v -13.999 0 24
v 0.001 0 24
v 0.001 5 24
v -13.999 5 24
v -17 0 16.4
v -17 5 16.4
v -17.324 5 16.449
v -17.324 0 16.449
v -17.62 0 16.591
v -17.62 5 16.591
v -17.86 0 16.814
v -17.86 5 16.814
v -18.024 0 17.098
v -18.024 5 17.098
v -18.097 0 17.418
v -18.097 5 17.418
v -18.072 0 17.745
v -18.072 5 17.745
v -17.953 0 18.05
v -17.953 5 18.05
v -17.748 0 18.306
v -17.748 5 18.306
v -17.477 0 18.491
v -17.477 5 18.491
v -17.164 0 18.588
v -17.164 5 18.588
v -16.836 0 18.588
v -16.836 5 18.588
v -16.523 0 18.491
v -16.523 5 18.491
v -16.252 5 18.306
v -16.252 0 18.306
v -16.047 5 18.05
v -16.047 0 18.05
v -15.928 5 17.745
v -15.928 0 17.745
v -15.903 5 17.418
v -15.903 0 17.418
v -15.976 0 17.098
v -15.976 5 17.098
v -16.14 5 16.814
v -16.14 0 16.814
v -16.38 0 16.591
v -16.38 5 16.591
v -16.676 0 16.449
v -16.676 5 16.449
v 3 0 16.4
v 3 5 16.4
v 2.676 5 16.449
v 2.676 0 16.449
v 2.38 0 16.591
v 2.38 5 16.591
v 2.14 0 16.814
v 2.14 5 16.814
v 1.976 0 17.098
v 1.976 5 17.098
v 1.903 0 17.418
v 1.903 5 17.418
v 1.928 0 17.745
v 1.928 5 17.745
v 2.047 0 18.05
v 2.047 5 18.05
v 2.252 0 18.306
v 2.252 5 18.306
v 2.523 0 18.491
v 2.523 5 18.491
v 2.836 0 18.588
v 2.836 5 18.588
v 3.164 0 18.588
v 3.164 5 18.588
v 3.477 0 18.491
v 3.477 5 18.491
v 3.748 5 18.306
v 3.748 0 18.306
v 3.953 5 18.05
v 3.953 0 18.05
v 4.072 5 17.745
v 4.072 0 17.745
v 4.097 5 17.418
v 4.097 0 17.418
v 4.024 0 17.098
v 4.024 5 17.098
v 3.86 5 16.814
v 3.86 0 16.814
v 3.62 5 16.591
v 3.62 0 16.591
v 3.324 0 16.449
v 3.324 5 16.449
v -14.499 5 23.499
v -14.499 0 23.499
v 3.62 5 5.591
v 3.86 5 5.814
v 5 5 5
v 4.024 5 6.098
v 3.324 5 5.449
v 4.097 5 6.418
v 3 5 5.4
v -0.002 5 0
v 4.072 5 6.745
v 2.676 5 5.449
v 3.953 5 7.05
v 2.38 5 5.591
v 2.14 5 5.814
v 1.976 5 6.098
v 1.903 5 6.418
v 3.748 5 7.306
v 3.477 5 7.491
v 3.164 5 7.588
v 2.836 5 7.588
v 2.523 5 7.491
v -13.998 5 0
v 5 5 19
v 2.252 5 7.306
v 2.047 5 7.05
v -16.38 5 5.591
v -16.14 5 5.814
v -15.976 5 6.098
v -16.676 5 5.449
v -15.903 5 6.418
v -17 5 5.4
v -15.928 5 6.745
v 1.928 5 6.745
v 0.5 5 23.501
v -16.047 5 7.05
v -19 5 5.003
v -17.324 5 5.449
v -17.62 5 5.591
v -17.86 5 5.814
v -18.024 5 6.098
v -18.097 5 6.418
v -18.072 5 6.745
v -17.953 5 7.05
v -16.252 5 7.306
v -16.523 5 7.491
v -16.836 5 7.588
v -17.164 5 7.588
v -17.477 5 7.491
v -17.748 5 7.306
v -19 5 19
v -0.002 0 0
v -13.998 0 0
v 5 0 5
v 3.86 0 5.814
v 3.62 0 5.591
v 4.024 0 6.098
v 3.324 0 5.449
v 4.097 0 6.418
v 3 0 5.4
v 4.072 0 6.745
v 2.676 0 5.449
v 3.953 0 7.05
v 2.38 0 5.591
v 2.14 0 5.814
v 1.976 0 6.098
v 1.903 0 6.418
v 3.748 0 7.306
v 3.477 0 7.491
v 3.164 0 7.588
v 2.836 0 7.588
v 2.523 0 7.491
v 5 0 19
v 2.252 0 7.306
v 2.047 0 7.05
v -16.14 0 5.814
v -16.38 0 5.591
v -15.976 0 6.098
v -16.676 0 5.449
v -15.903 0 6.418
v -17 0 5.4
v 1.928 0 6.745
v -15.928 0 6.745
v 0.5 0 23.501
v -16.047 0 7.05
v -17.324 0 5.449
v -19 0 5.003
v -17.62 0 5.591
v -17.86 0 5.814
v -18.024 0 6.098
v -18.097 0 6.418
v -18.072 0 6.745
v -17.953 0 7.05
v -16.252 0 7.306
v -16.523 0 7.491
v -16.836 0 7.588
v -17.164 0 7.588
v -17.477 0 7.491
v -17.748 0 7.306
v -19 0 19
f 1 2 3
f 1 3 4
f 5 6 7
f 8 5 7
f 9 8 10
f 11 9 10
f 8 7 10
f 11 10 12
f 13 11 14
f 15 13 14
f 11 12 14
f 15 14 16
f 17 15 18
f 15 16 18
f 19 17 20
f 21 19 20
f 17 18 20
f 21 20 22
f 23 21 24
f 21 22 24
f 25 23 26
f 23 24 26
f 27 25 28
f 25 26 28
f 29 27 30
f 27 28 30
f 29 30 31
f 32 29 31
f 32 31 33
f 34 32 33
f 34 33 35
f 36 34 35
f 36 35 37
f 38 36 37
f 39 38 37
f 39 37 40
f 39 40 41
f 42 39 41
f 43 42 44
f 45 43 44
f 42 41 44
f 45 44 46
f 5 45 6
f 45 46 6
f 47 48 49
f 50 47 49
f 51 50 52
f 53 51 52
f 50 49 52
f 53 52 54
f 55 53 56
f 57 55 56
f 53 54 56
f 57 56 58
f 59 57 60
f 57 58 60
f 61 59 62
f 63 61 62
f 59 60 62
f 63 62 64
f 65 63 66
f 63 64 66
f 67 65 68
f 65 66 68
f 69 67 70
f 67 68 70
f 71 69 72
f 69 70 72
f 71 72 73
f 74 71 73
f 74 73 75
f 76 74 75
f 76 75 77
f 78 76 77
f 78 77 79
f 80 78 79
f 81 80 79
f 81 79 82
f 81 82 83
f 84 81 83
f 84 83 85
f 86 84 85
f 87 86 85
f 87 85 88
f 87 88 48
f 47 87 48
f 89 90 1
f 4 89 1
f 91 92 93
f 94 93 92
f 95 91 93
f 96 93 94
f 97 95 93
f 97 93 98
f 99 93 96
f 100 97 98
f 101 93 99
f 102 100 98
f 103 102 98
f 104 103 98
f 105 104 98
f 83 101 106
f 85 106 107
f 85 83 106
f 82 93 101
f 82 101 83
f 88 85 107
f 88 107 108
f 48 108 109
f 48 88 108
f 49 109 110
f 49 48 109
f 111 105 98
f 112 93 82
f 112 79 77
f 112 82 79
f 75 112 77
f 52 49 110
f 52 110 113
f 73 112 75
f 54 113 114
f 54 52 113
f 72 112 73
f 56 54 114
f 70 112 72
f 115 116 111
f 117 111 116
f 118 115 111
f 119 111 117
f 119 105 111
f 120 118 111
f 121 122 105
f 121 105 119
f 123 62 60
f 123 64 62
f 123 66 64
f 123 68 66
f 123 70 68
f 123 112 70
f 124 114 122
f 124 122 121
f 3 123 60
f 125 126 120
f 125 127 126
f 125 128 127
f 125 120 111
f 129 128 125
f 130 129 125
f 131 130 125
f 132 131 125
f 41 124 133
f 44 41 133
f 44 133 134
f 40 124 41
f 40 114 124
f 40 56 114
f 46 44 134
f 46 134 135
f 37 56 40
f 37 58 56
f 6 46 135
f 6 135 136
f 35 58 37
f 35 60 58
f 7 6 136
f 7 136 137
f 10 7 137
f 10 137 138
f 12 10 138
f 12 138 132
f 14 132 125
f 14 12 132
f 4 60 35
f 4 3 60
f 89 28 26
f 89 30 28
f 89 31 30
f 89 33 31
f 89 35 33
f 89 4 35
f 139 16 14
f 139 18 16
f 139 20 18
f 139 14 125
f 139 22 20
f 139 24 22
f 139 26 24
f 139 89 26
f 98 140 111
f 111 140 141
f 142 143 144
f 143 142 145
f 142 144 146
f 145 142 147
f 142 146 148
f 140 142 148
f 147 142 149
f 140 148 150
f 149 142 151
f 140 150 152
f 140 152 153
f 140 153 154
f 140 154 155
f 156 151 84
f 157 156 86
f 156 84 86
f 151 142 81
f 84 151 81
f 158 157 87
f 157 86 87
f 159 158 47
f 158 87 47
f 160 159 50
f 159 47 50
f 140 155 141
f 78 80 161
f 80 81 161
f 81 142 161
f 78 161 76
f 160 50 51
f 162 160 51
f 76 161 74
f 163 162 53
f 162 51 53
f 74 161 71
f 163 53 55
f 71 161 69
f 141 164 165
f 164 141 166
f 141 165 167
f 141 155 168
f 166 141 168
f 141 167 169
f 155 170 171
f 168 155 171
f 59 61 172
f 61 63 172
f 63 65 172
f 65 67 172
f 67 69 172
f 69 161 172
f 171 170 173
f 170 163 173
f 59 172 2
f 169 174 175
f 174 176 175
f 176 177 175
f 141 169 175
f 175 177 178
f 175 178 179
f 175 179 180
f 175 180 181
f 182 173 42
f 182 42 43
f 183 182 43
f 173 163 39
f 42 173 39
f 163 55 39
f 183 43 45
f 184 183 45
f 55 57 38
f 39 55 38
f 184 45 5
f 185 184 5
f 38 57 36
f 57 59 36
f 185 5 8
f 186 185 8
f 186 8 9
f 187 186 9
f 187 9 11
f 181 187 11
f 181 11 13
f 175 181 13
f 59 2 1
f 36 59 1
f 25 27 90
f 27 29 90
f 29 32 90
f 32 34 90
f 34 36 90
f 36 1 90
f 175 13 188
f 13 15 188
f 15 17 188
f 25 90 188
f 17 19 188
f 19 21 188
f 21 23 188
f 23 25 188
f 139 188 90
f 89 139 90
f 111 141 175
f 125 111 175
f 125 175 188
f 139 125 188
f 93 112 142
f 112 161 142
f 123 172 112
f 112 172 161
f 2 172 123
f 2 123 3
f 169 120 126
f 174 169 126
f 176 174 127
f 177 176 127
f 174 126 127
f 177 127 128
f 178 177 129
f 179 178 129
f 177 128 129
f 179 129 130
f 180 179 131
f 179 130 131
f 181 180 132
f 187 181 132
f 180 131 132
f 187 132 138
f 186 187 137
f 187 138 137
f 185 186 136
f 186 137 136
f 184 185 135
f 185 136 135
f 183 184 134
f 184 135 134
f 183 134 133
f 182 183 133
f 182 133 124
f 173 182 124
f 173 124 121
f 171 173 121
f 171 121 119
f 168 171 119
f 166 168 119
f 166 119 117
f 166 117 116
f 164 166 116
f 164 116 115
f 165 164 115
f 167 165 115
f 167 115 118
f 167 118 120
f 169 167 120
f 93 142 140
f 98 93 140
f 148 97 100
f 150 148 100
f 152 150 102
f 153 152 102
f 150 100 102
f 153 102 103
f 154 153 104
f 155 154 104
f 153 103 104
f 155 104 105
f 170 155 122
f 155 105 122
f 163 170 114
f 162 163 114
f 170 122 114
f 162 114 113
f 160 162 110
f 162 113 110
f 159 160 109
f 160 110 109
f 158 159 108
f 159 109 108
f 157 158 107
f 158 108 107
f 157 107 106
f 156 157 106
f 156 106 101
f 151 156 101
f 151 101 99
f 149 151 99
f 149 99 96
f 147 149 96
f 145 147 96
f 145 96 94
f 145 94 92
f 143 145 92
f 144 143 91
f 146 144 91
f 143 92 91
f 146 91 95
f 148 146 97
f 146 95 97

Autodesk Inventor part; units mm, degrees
ref_plane "YZ Plane" through (0, 0, 0) normal (1, 0, 0) x (0, 1, 0)
ref_plane "XZ Plane" through (0, 0, 0) normal (0, 1, 0) x (-1, 0, 0)
ref_plane "XY Plane" through (0, 0, 0) normal (0, 0, 1) x (1, 0, 0)
sketch "Sketch1" plane through (0, 0, 0) normal (0, 1, 0) x (-1, 0, 0)
  line L0 (10.5005, 23.9999) -> (3.4998, 23.9999)
  line L1 (3.4998, 23.9999) -> (10.5005, 23.9999)
  line L2 (-4.9999, 18.9997) -> (-4.9999, 5.0001)
  line L3 (-0.5002, 23.5006) -> (-4.9999, 18.9997)
  line L4 (-4.9999, 18.9997) -> (-4.9999, 5.0001)
  line L5 (0.0015, 0) -> (13.9982, -0.0002)
  line L6 (-4.9999, 5.0001) -> (0.0015, 0)
  line L7 (0.0015, 0) -> (13.9982, -0.0002)
  line L8 (13.9982, -0.0002) -> (18.9999, 5.0029)
  line L9 (18.9999, 5.0029) -> (19.0001, 19)
  line L10 (18.9999, 5.0029) -> (19.0001, 19)
  line L11 (19.0001, 19) -> (14.4994, 23.4994)
  circle A0 centre (17, 17.4999) radius 0.8
  circle A1 centre (17, 17.4999) radius 0.8
  circle A2 centre (17, 6.5) radius 0.8
  circle A3 centre (17, 6.5) radius 0.8
  circle A4 centre (-3, 17.5) radius 0.8
  circle A5 centre (-3, 17.5) radius 0.8
  circle A6 centre (-3, 6.5) radius 0.8
  circle A7 centre (-3, 17.5) radius 0.8
  line L12 (19.0001, 19) -> (19.0001, 16.4173)
  line L13 (19.0001, 19) -> (19, 15.3998)
  line L14 (19.0001, 19) -> (19, 15.3998)
  line L15 (19.0001, 19) -> (18.3991, 19.6008)
  line L16 (19.0001, 19) -> (18.3998, 19.6001)
  line L17 (19.0001, 19) -> (19, 11.9999)
  line L18 (19, 11.9999) -> (-4.9999, 11.9999)
  line L19 (19, 11.9999) -> (7, 11.9999)
  line L20 (6.9998, -0.0001) -> (7.0002, 23.9999)
  line L21 (-4.8205, 19.6001) -> (-4.8205, 19.6005)
  line L22 (-2.9994, 19.6006) -> (-2.9994, 19.6001)
  line L23 (10.5005, 23.9999) -> (13.9988, 23.9999)
  line L24 (14.4994, 23.4994) -> (13.9988, 23.9999)
  line L25 (3.4998, 23.9999) -> (-0.001, 23.9999)
  line L26 (-0.5002, 23.5006) -> (-0.001, 23.9999)
  point P0 (0, 0)
  point P1 (0, 0)
  point P2 (10, 14.9997)
  point P3 (4.0003, 14.9997)
  point P4 (4.0003, 8.0001)
  point P5 (7, 14.9997)
  point P6 (7, 14.9997)
  point P7 (7, 14.9997)
  point P8 (7, 11.9999)
  point P9 (-4.9999, 15.4002)
  point P10 (-4.9999, 8.6003)
  point P11 (-4.3996, 4.4)
  point P12 (18.3968, 4.3997)
  point P13 (18.9999, 8.6)
  point P14 (19, 15.3998)
  point P15 (18.9999, 8.6)
  dimension "d2" = 1.6
extrude "Extrusion1" add sketch "Sketch1" along normal blind 5
hole "Hole1" at (-17, 0, 6.5) at (-17, 0, 17.4999) at (3, 0, 17.5) at (3, 0, 6.5) direction (0, 1, 0) diameter 2.2 end through all clearance for "Countersunk Flat Head Screw ISO 2009/7046" size "M2" standard "ISO"
properties part number "marcor_isolator"
